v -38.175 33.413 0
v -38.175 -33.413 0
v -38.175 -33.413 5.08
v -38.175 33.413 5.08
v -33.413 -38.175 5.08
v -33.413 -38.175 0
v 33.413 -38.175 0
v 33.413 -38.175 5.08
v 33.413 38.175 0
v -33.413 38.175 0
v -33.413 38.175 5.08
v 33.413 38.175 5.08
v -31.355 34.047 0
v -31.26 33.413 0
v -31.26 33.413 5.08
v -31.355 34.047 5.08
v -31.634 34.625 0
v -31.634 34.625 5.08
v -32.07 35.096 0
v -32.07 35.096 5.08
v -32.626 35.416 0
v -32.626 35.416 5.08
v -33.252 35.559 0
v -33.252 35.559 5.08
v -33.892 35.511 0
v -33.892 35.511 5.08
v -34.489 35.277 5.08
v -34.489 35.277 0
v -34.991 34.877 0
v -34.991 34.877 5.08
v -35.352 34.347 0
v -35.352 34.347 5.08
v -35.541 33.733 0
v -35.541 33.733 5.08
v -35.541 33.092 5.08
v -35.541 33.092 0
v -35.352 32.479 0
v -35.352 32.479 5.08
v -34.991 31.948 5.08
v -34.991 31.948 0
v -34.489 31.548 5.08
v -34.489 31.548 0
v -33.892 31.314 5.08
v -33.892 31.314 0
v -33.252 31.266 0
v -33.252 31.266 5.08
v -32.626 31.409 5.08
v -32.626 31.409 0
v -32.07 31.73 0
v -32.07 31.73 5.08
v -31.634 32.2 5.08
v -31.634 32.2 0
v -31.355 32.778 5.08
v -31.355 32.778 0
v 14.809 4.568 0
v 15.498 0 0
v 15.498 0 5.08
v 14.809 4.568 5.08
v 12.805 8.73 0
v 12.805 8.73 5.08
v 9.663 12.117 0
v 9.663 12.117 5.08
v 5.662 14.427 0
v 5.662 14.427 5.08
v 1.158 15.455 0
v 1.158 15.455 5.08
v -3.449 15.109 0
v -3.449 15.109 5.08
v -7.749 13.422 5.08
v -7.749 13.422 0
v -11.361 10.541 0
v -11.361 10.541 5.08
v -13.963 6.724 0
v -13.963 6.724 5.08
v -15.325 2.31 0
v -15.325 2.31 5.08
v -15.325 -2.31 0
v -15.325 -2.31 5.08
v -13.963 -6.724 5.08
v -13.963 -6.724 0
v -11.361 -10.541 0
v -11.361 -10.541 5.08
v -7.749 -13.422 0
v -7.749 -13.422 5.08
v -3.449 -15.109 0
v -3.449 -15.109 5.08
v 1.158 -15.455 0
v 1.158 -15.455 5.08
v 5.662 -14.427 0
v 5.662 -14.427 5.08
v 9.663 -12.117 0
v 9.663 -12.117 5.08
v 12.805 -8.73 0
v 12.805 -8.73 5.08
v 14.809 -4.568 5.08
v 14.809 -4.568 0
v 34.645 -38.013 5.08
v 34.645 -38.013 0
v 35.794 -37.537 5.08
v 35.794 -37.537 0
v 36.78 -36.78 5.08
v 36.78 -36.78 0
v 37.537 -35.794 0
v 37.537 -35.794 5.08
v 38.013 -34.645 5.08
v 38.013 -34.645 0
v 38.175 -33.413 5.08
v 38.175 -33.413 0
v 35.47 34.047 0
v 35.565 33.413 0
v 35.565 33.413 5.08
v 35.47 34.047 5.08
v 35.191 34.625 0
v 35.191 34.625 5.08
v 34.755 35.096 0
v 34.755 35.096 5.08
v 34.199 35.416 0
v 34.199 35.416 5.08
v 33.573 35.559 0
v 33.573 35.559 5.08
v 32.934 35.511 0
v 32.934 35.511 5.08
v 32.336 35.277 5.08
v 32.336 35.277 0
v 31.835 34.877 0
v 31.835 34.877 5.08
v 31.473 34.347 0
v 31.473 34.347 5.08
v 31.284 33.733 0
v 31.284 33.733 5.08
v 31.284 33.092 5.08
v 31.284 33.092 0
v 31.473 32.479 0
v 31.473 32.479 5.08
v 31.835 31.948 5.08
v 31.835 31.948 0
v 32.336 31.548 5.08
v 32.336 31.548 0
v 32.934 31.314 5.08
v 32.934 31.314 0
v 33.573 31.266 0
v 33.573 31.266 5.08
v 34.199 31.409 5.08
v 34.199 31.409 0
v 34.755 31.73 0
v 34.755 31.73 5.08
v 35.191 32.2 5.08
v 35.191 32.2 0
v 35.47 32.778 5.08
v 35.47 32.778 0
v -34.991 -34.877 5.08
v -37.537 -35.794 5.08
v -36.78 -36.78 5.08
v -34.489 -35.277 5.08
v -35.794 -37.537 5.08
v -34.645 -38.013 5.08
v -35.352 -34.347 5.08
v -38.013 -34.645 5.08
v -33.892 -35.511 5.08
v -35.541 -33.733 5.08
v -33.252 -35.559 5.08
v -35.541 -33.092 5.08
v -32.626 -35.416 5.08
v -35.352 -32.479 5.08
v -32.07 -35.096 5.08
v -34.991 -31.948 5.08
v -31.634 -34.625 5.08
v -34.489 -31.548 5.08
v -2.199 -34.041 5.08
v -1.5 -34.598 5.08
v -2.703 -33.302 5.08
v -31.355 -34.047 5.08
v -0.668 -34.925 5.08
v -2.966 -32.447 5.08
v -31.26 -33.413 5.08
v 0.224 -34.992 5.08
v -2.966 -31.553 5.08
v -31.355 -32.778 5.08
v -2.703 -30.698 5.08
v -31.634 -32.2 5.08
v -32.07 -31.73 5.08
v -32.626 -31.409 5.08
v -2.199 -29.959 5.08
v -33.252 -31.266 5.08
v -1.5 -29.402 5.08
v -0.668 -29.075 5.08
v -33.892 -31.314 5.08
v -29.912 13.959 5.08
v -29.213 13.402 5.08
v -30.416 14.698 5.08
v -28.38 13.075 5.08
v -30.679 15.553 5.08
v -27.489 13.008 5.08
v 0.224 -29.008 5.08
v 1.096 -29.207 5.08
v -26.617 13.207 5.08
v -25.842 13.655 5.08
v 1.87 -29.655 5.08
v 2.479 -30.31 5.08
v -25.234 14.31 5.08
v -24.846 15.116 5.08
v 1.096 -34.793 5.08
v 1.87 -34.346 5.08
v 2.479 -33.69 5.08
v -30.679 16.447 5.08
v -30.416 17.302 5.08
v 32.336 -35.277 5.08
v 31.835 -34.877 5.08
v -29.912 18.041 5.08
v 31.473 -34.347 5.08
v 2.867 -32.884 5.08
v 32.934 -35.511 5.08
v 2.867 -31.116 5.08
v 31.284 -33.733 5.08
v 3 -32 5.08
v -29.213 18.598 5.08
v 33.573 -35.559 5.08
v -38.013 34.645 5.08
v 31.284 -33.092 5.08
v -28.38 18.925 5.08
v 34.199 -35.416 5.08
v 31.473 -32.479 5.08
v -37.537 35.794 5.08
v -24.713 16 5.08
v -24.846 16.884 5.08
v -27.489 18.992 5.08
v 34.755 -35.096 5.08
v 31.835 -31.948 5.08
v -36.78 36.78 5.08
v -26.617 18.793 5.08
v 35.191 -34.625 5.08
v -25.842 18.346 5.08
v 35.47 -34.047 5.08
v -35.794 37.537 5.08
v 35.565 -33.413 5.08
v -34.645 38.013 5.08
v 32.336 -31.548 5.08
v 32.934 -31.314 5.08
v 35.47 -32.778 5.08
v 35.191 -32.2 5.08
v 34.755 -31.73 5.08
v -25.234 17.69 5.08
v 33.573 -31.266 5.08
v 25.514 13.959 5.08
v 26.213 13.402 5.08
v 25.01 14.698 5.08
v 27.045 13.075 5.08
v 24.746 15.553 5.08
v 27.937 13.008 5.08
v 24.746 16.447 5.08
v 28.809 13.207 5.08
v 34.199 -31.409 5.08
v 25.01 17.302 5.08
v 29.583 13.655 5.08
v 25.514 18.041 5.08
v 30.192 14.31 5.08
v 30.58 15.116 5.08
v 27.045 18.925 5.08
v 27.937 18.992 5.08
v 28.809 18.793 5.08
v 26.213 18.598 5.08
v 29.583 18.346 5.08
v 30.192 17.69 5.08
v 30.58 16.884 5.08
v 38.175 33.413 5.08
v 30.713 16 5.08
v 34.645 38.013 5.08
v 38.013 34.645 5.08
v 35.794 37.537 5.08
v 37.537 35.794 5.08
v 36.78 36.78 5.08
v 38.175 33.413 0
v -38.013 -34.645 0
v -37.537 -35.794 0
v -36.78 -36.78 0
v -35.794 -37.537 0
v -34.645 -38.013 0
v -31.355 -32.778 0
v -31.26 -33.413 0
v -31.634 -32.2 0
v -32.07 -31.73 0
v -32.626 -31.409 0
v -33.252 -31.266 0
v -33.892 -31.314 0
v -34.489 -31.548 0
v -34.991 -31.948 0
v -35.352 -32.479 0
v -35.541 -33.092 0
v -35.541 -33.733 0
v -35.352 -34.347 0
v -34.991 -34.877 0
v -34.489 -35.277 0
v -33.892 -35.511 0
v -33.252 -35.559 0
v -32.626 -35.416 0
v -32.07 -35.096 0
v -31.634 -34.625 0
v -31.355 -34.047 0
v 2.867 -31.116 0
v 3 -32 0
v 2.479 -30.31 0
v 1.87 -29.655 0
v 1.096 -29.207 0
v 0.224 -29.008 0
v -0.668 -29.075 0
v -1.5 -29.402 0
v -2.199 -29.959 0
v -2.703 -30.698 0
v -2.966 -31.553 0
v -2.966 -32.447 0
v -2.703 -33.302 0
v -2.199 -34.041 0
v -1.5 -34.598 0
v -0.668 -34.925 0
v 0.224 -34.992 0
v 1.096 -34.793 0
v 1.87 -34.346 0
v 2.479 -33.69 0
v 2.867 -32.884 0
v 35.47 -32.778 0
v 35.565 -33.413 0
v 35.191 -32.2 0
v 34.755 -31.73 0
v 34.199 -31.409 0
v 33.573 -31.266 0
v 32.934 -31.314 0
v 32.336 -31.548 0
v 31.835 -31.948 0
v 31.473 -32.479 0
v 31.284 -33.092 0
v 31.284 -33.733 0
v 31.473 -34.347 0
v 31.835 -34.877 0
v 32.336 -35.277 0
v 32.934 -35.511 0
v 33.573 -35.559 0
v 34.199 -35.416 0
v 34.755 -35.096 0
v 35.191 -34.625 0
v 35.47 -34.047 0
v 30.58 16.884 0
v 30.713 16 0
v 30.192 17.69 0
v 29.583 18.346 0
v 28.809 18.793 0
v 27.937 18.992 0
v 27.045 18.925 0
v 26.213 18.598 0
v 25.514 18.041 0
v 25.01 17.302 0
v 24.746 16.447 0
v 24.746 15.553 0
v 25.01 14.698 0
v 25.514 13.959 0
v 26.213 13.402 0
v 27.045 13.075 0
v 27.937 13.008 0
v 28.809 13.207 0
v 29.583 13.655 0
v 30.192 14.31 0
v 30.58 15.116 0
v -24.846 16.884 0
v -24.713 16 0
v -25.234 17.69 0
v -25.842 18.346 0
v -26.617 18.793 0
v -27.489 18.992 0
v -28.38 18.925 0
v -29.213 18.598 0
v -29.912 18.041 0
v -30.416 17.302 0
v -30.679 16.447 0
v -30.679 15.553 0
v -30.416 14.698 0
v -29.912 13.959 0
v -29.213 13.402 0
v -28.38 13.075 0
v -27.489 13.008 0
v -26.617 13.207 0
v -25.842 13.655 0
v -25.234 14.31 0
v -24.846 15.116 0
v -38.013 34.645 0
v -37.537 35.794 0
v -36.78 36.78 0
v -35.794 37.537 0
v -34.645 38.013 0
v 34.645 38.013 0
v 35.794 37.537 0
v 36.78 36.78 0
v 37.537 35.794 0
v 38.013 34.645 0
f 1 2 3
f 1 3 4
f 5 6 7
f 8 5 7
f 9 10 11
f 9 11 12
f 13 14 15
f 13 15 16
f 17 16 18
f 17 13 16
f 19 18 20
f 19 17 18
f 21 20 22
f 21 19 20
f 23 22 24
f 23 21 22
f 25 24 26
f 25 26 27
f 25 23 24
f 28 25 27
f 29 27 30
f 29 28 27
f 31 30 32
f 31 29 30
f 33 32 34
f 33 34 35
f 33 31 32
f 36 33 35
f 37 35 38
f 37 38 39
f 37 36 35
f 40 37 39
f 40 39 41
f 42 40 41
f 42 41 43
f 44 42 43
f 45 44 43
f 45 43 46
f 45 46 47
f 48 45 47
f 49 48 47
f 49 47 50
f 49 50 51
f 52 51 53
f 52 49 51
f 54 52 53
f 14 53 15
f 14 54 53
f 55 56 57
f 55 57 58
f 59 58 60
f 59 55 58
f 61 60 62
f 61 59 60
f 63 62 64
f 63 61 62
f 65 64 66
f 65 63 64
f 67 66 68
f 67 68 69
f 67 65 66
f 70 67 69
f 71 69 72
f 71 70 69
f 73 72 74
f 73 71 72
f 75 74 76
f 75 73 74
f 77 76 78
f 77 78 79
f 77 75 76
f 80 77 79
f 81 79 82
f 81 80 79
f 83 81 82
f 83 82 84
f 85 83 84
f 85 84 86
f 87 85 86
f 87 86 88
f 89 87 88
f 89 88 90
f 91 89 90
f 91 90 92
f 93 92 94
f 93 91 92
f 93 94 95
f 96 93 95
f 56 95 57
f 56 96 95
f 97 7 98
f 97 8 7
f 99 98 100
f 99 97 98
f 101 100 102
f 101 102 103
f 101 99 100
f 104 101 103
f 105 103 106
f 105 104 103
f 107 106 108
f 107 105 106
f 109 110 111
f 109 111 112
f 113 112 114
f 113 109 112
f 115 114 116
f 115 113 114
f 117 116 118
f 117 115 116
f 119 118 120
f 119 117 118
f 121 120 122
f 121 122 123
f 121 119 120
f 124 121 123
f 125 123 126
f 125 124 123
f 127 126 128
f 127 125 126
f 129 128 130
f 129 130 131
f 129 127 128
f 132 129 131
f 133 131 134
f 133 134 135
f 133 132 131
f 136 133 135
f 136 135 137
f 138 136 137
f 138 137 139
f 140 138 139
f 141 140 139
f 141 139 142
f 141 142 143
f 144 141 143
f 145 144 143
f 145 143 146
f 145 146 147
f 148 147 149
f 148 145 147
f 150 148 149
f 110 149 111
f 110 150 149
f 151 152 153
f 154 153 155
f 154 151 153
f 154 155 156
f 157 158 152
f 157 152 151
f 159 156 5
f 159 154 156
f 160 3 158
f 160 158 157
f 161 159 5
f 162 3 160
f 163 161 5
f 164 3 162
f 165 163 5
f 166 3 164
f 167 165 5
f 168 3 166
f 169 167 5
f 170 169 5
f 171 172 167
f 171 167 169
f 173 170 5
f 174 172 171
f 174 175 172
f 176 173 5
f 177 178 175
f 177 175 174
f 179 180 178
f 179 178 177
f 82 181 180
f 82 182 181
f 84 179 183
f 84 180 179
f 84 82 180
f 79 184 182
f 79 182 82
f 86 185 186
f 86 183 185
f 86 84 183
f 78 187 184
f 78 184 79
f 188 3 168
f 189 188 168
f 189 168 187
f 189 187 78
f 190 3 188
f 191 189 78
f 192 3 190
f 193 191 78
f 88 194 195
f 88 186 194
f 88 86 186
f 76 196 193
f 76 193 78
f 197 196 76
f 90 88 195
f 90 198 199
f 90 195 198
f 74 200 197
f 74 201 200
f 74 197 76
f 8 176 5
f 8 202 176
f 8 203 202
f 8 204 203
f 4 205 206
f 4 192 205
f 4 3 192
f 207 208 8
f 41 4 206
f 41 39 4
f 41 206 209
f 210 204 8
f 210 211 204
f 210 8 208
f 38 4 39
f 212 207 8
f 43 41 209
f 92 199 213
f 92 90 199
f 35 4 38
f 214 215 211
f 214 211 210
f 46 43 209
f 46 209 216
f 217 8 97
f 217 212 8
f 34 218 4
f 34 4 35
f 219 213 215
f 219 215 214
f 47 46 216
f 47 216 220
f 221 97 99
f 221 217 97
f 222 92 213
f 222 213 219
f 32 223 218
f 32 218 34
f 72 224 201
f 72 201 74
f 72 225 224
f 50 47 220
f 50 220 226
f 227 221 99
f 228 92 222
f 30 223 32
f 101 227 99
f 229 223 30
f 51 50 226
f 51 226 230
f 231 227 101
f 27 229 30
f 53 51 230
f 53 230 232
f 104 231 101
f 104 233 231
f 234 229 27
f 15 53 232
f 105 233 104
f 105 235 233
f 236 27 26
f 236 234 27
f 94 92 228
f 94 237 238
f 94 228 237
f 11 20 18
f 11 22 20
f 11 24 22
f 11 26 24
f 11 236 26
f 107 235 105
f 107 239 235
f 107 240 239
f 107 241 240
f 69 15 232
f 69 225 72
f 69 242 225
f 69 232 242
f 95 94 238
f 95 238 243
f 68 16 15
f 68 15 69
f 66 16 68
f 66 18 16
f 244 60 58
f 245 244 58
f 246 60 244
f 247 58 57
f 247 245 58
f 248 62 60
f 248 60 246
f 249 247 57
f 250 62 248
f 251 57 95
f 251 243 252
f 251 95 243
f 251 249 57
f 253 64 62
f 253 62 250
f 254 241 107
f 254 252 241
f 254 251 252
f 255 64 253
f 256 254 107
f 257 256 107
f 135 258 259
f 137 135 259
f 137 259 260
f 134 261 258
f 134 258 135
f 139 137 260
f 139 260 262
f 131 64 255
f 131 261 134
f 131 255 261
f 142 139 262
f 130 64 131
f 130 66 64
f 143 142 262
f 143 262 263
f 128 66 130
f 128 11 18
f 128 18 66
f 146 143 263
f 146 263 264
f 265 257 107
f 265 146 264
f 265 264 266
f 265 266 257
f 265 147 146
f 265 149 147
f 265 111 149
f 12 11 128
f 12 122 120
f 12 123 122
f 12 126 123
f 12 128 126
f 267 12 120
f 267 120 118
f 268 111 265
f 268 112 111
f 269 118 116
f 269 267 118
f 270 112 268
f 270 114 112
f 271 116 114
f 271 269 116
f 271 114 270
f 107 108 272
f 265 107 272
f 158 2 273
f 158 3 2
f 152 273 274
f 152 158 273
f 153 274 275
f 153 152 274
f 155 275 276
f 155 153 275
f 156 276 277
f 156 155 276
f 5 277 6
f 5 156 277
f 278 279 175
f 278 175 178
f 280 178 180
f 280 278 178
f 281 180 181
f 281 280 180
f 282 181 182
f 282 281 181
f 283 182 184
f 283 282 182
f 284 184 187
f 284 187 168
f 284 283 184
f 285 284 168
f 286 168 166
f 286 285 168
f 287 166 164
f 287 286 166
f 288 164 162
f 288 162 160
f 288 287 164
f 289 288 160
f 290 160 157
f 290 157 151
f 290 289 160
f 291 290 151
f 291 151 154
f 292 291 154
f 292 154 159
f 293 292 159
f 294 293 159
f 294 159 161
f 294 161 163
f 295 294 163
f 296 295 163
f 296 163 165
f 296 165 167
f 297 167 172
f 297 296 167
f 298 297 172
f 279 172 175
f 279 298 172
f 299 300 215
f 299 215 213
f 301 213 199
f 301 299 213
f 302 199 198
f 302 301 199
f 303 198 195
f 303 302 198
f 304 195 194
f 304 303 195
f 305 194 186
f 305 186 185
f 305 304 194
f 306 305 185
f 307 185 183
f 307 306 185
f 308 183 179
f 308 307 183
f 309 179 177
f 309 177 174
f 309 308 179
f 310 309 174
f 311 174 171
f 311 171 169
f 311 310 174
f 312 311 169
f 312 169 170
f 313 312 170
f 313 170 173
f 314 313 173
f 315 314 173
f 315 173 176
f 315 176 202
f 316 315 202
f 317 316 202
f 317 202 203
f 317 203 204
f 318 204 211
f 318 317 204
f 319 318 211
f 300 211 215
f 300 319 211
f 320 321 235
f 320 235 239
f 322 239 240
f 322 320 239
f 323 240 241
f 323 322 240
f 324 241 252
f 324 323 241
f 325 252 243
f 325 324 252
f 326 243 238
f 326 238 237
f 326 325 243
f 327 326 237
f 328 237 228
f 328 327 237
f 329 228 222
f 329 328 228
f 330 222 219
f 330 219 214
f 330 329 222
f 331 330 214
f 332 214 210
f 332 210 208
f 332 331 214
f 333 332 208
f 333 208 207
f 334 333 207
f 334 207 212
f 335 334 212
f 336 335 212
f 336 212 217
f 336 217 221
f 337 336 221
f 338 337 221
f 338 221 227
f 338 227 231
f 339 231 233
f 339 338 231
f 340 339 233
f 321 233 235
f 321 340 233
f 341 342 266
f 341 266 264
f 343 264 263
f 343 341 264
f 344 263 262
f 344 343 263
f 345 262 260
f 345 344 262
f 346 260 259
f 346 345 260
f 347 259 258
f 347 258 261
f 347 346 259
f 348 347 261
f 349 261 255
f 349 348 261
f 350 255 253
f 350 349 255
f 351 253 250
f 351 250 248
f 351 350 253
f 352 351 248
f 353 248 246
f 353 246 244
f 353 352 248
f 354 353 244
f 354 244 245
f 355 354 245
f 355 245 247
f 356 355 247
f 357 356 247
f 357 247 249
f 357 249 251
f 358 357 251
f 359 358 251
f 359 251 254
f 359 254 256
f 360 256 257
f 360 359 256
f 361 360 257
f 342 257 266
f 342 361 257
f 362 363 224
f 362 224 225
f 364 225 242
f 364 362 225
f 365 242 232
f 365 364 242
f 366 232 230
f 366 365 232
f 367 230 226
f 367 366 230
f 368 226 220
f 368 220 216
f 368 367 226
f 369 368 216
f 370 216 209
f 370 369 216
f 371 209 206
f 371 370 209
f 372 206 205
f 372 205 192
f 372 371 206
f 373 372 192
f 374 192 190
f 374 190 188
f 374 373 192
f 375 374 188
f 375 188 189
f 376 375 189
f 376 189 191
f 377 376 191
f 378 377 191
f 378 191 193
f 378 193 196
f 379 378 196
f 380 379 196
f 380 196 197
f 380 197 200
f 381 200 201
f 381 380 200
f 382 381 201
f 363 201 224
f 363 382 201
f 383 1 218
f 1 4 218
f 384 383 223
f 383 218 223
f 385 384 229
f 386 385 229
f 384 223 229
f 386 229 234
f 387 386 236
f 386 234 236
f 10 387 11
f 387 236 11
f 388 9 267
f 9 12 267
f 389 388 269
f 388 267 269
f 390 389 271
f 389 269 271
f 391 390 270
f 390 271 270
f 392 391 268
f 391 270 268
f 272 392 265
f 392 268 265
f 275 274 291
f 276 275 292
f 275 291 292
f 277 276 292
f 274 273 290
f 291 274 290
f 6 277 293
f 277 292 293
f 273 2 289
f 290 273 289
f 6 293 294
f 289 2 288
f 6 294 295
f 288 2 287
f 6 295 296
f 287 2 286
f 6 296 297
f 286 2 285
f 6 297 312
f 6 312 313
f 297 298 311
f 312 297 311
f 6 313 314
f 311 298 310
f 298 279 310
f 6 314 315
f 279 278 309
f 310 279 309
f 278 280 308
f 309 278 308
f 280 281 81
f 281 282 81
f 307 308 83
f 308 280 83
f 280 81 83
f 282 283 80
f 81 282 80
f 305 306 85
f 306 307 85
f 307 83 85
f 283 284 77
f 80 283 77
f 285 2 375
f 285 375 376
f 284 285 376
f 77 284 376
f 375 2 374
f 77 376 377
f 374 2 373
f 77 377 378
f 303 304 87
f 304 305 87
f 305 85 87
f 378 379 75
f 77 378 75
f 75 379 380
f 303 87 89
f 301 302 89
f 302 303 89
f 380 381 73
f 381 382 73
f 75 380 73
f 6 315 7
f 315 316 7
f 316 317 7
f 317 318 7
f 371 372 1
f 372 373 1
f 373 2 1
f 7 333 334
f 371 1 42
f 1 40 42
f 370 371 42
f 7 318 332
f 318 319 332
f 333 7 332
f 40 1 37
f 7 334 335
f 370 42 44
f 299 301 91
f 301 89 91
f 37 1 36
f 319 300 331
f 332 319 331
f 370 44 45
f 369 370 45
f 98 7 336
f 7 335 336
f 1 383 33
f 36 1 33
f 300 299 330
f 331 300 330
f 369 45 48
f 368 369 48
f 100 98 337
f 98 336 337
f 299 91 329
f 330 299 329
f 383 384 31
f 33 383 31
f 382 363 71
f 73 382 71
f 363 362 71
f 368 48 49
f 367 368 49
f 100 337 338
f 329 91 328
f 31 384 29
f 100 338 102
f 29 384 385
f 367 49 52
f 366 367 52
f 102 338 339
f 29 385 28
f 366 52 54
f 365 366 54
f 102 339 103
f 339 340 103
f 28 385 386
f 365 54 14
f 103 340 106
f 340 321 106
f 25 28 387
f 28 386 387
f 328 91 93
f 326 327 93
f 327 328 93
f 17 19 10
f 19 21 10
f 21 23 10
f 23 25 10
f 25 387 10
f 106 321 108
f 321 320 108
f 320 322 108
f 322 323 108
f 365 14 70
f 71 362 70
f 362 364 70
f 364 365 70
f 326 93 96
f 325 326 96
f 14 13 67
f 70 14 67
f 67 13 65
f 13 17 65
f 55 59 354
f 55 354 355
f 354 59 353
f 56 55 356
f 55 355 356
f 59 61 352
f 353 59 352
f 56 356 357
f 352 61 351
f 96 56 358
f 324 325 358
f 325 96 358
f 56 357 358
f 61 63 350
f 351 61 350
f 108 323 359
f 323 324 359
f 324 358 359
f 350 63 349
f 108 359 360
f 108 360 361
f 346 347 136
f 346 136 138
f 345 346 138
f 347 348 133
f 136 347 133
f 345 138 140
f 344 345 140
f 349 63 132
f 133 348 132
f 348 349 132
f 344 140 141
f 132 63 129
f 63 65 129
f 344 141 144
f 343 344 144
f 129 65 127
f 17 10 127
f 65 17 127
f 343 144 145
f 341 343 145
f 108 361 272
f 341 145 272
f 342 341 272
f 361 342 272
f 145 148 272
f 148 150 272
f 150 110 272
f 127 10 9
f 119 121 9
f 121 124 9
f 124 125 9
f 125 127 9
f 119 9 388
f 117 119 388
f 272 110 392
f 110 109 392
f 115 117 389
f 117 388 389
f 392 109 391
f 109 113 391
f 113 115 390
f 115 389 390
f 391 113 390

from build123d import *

# Parameters (mm, degrees)
F0_W     = 76.350024
F0_H     = 76.350024
F0_R     = 2.15265
F0_R_2   = 3
F0_R_3   = 15.497899
F1_DEPTH = 5.08
F2_R     = 4.7625


with BuildPart() as f1:
    # F0 (on Top) → F1 (new body)
    with BuildSketch(Plane.XY):
        Rectangle(F0_W, F0_H)
        with Locations((-33.412512, -33.412512)):
            Circle(F0_R, mode=Mode.SUBTRACT)
        with Locations((0, -32.000012)):
            Circle(F0_R_2, mode=Mode.SUBTRACT)
        with Locations((33.412512, -33.412512)):
            Circle(F0_R, mode=Mode.SUBTRACT)
        with Locations((-27.712823, 16.000006)):
            Circle(F0_R_2, mode=Mode.SUBTRACT)
        with Locations((-33.412512, 33.412512)):
            Circle(F0_R, mode=Mode.SUBTRACT)
        Circle(F0_R_3, mode=Mode.SUBTRACT)
        with Locations((27.712823, 16.000006)):
            Circle(F0_R_2, mode=Mode.SUBTRACT)
        with Locations((33.412512, 33.412512)):
            Circle(F0_R, mode=Mode.SUBTRACT)
    extrude(amount=F1_DEPTH)

    # F2
    f2_edges = [f1.edges().sort_by_distance(p)[0] for p in [
        (-38.175012, 38.175012, 2.54),
        (38.175012, 38.175012, 2.54),
        (38.175012, -38.175012, 2.54),
        (-38.175012, -38.175012, 2.54),
    ]]
    fillet(f2_edges, radius=F2_R)


solid = f1.part
